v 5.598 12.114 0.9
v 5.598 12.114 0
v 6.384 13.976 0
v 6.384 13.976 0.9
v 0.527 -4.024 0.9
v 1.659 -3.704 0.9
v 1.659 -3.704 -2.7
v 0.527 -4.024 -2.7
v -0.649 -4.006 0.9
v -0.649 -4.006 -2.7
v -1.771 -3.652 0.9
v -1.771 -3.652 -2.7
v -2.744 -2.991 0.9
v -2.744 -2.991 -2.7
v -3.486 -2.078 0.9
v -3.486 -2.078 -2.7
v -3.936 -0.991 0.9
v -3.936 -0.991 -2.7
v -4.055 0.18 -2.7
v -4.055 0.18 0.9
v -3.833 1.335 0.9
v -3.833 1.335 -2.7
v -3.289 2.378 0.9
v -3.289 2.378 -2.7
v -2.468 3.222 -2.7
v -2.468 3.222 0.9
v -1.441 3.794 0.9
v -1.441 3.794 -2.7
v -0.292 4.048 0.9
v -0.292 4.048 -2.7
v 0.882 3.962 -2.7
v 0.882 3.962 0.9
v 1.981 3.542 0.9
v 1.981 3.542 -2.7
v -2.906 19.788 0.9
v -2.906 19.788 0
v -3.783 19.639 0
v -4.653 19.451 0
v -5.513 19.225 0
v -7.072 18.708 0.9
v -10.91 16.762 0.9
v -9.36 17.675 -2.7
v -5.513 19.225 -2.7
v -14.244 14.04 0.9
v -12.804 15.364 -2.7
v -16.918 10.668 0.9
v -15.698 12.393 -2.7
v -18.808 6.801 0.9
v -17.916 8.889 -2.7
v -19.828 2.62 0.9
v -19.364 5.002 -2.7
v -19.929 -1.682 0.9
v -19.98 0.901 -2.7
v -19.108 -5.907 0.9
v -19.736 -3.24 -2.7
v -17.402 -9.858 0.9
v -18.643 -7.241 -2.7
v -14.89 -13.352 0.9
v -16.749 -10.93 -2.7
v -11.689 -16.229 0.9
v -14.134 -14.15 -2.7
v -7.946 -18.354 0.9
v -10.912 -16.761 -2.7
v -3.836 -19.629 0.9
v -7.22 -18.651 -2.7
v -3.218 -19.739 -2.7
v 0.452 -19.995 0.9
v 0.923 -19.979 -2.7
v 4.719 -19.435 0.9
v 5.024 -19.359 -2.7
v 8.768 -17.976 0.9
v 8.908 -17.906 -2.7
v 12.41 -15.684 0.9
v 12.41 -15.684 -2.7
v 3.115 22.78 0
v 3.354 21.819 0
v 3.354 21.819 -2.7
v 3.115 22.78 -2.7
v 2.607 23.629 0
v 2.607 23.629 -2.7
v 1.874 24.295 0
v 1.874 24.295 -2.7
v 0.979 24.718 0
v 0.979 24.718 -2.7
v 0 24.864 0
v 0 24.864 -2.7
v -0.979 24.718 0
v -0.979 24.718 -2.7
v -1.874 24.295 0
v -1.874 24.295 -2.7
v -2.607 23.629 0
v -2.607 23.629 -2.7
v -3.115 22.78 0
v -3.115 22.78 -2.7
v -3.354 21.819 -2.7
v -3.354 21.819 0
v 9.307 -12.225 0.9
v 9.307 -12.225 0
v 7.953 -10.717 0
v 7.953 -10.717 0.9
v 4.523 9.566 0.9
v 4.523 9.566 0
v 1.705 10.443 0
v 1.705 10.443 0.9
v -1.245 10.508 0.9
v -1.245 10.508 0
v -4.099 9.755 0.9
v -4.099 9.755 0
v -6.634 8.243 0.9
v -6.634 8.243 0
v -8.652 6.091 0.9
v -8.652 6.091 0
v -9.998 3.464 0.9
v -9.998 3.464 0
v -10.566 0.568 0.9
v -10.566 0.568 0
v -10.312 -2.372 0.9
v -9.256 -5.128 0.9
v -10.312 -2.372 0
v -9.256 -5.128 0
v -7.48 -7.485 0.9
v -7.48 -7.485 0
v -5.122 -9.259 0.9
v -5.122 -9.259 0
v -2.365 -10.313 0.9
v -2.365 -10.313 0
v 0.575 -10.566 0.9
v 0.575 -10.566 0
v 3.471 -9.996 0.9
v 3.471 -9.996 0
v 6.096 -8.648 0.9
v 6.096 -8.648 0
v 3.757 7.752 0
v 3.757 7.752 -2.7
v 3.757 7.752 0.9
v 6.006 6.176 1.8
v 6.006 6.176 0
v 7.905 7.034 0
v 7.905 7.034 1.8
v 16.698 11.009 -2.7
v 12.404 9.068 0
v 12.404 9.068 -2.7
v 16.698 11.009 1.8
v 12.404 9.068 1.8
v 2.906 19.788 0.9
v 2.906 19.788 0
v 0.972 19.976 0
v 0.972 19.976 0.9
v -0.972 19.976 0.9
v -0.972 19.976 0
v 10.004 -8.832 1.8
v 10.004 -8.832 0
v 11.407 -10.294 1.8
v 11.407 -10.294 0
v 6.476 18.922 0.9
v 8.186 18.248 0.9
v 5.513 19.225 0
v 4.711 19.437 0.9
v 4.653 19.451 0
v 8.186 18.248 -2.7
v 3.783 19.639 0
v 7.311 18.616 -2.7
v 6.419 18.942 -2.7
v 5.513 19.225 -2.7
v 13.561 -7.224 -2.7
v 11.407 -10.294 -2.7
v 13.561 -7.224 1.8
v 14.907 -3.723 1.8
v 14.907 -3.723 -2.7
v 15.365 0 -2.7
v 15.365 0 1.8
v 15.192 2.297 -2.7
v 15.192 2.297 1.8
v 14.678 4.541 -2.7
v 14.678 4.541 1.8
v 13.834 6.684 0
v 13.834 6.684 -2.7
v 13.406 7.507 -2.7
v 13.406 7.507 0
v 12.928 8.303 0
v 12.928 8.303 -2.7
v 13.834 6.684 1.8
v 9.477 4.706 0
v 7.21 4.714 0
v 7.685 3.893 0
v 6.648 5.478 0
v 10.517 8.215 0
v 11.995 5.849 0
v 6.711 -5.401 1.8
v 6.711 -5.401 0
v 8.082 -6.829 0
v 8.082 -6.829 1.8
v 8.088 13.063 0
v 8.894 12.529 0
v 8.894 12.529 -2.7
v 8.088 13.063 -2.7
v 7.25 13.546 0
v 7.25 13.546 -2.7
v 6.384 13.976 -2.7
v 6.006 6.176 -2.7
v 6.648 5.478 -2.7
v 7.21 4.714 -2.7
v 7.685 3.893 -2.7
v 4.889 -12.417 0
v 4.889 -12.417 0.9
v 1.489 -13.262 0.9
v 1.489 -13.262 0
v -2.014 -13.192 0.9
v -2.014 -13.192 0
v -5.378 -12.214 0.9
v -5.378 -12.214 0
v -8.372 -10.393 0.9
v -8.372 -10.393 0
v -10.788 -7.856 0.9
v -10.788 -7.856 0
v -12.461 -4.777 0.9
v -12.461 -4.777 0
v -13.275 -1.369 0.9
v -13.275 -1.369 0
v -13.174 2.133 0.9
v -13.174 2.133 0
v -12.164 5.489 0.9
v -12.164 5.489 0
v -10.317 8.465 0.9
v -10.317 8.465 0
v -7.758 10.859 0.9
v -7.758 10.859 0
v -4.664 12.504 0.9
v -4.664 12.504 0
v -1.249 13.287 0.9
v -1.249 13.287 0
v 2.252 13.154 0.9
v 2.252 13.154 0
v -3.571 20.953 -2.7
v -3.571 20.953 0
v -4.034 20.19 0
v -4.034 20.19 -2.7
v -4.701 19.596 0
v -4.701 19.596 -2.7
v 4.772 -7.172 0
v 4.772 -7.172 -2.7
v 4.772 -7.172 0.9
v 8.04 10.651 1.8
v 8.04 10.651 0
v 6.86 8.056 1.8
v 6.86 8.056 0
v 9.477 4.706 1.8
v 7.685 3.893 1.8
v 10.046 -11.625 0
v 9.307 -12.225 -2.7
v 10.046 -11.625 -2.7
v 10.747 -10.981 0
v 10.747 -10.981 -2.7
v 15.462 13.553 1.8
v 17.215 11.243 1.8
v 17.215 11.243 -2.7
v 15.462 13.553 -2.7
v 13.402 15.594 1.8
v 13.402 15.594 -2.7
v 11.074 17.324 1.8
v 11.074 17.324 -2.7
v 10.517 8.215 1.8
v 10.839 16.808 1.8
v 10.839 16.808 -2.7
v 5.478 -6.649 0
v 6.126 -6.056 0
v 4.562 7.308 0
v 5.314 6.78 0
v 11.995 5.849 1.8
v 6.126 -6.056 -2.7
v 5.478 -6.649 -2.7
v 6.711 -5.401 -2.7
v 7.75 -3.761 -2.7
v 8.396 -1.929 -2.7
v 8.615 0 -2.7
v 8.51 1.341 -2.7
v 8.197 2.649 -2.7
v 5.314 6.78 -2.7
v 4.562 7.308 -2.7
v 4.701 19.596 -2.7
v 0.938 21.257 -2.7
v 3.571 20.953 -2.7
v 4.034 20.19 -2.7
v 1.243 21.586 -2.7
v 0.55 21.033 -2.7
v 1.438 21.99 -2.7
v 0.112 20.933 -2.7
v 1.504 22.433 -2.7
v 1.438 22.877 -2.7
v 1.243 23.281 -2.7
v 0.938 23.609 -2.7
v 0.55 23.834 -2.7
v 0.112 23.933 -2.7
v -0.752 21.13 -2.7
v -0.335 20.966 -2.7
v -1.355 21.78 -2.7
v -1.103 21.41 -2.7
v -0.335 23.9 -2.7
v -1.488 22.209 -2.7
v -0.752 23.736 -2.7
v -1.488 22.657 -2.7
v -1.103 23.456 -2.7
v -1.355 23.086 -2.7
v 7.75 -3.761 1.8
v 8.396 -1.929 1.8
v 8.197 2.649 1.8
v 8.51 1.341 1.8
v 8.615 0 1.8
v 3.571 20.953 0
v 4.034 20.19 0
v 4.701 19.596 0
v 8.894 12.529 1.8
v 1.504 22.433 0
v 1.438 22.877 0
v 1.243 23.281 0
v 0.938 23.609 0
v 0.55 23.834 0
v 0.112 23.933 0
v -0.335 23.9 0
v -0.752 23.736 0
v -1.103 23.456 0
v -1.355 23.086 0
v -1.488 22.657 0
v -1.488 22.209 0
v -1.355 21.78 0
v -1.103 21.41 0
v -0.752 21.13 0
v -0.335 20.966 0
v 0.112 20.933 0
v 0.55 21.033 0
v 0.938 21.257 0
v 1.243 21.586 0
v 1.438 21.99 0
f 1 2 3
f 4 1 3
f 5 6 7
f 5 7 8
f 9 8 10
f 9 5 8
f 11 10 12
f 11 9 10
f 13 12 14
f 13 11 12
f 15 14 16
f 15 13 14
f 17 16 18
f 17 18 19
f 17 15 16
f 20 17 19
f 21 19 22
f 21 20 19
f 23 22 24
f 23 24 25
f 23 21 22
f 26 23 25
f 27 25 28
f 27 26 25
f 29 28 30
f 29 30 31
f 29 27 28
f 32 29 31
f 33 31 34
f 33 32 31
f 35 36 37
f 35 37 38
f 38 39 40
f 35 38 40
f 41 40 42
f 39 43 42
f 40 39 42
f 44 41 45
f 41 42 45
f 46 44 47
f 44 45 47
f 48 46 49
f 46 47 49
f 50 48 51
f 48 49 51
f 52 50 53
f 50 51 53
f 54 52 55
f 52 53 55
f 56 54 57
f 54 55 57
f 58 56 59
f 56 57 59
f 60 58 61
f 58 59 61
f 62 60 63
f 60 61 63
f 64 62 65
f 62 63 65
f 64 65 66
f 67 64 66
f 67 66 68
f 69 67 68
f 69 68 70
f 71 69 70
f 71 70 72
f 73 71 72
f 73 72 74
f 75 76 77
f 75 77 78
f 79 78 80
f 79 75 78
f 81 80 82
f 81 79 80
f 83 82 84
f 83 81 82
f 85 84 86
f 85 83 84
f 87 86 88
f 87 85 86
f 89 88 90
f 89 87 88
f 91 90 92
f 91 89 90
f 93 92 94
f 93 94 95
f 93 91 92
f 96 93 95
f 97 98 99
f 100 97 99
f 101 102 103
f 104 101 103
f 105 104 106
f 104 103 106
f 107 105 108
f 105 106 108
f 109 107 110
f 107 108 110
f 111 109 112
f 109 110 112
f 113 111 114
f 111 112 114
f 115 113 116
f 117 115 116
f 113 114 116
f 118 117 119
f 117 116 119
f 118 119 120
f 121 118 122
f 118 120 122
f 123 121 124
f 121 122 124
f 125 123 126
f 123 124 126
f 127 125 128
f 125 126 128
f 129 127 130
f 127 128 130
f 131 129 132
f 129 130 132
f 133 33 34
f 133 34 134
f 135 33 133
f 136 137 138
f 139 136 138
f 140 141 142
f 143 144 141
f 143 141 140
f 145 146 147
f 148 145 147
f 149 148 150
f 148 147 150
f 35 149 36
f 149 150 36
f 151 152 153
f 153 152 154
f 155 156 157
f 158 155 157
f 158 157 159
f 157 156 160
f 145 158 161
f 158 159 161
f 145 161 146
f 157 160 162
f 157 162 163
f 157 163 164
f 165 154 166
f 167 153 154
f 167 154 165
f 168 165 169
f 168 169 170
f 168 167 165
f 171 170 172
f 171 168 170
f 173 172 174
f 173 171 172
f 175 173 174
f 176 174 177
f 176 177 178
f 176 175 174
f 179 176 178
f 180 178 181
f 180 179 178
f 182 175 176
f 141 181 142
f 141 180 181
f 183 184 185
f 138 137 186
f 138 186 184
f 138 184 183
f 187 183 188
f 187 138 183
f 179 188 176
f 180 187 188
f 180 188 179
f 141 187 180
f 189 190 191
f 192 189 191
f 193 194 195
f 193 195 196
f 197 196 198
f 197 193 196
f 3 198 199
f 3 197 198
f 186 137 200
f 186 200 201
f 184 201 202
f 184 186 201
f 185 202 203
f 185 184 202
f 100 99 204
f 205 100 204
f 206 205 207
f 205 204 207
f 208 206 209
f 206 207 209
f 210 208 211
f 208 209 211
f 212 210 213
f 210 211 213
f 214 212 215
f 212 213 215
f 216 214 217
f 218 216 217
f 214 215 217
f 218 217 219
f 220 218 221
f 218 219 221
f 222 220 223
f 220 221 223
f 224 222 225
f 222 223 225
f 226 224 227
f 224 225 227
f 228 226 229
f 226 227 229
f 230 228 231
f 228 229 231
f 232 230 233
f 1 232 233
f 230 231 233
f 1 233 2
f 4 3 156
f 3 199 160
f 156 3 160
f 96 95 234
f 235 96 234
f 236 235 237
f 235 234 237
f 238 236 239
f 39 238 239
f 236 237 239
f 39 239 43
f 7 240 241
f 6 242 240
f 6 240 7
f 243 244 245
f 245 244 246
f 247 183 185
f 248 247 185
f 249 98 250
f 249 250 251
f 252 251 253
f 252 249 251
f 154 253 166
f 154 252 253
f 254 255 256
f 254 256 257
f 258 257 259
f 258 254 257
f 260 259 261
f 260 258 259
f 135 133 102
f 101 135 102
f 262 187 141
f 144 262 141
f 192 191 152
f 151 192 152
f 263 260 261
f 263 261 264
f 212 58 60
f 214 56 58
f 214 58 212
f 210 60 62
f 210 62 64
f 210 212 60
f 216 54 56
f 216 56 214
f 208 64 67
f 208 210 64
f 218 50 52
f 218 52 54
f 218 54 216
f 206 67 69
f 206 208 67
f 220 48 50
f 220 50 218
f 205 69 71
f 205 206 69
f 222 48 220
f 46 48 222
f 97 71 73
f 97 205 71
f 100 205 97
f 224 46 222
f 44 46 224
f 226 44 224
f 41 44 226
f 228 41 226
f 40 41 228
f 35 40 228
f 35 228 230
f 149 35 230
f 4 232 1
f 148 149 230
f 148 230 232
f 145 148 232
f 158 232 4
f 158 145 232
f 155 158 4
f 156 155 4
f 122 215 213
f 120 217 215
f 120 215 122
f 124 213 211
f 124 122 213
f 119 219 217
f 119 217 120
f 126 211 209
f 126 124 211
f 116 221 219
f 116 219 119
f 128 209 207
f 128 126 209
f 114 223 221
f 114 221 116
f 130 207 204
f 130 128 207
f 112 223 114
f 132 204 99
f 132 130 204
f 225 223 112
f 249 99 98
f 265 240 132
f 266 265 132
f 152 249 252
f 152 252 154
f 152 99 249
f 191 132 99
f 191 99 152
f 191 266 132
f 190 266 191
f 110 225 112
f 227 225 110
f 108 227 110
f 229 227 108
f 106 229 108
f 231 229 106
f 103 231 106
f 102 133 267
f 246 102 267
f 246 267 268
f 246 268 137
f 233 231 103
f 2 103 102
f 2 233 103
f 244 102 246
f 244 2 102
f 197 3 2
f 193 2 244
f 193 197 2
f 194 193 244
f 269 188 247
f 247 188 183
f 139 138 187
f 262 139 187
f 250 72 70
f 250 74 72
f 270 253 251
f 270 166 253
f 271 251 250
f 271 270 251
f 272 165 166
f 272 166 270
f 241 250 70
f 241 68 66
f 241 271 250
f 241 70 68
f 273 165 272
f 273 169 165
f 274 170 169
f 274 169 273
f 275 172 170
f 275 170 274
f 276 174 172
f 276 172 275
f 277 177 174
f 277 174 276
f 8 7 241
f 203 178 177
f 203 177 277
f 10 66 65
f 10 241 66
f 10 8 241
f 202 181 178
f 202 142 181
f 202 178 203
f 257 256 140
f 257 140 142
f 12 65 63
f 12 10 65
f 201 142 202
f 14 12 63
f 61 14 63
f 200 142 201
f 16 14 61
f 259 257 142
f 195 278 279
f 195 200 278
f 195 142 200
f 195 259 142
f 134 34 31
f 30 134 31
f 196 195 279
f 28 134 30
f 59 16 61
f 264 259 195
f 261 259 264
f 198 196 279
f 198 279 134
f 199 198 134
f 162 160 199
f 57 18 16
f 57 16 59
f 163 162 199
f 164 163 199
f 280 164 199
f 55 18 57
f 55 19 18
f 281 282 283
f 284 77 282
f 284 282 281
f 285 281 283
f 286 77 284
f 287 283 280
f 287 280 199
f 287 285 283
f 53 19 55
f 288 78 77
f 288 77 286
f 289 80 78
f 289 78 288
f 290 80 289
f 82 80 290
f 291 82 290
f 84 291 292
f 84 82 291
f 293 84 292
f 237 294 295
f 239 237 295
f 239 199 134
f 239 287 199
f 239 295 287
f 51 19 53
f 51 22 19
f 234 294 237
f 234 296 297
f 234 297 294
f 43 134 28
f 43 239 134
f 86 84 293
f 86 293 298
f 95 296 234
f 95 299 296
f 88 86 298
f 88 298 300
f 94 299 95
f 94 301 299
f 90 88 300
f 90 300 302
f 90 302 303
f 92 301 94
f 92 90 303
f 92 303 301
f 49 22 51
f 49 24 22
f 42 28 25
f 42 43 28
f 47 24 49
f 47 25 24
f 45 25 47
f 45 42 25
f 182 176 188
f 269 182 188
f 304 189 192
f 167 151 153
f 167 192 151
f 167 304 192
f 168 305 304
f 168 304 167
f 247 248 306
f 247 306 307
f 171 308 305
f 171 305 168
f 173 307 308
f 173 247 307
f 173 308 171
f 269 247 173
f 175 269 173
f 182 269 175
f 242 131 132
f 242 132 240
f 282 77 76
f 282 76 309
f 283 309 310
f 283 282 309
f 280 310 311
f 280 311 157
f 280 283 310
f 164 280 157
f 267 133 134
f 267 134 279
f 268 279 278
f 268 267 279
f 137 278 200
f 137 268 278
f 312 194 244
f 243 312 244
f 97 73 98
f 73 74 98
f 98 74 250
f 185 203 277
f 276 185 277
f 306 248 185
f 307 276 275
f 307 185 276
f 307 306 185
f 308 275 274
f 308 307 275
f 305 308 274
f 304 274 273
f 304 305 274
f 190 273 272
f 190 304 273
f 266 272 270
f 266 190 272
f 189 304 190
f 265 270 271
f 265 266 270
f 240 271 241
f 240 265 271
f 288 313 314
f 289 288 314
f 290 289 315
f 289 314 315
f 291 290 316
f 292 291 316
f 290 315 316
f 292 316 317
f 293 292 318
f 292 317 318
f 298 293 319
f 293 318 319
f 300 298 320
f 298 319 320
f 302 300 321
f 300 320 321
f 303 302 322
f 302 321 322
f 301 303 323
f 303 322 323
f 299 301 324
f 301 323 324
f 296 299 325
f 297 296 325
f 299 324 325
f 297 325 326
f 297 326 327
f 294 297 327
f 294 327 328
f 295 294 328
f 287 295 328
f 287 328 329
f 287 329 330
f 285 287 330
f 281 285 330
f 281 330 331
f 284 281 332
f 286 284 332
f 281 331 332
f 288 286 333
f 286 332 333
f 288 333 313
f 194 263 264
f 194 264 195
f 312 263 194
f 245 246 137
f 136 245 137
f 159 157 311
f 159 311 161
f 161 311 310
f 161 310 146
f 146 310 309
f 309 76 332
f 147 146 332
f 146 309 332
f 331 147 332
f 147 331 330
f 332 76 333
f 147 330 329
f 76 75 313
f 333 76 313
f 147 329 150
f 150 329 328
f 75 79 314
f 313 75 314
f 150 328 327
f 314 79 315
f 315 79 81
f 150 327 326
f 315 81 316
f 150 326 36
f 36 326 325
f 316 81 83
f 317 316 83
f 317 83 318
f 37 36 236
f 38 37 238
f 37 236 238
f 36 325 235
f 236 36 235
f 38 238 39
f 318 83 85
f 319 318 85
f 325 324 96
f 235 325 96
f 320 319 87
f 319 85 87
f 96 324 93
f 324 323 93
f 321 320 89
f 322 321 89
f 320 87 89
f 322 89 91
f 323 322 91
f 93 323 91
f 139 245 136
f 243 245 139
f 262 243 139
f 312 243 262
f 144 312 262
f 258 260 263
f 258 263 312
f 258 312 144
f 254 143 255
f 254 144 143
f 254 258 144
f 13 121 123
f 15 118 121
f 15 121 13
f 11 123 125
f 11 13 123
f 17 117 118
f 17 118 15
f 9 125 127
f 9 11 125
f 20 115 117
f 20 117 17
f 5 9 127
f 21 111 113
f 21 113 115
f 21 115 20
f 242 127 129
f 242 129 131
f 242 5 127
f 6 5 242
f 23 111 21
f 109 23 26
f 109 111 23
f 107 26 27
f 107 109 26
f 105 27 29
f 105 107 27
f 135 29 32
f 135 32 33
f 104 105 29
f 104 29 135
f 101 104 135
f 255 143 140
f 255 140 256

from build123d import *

# Parameters (mm, degrees)
F0_R        = 1.5044645314
F1_DEPTH    = 2.7
F2_DEPTH    = 0.9
F3_DEPTH    = 2.7
F4_DEPTH    = 1.8
F5_T1_DEPTH = 2.7


# Not quite as in the source:
# - a fillet or chamfer that OpenCascade refuses, or shapes differently, is made with other operations: its cross-section is extruded or revolved along the edge and cut away or added


with BuildPart() as f1:
    # F0 (on Top) → F1 (new body)
    with BuildSketch(Plane.XY):
        with BuildLine():
            ThreePointArc((-2.9059050305, 19.7877668258), (-18.361479671, -7.928181651), (12.4102011034, -15.6839697964))
            Line((12.4102011034, -15.6839697964), (9.3065271924, -12.2254227754))
            ThreePointArc((9.3065271924, -12.2254227754), (-15.2699304913, -1.7034180964), (6.3836906961, 13.9757255095))
            Line((6.3836906961, 13.9757255095), (8.1864677167, 18.2477874364))
            ThreePointArc((8.1864677167, 18.2477874364), (5.5993809855, 19.2001805351), (2.9059050305, 19.7877668258))
            ThreePointArc((2.9059050305, 19.7877668258), (0, 18.1241204417), (-2.9059050305, 19.7877668258))
        make_face()
        with BuildLine():
            ThreePointArc((6.3836906961, 13.9757255095), (-15.2699304913, -1.7034180964), (9.3065271924, -12.2254227754))
            Line((9.3065271924, -12.2254227754), (7.9527661976, -10.7168731694))
            ThreePointArc((7.9527661976, -10.7168731694), (-13.2749249311, -1.3690247612), (5.5982117915, 12.114366903))
            Line((5.5982117915, 12.114366903), (6.3836906961, 13.9757255095))
        make_face()
        with BuildLine():
            ThreePointArc((5.5982117915, 12.114366903), (-13.2749249311, -1.3690247612), (7.9527661976, -10.7168731694))
            Line((7.9527661976, -10.7168731694), (6.0964799797, -8.6483397626))
            ThreePointArc((6.0964799797, -8.6483397626), (-10.5418803683, -0.9108276969), (4.5227579261, 9.5658512185))
            Line((4.5227579261, 9.5658512185), (5.5982117915, 12.114366903))
        make_face()
        with BuildLine():
            ThreePointArc((4.5227579261, 9.5658512185), (-10.5418803683, -0.9108276969), (6.0964799797, -8.6483397626))
            Line((6.0964799797, -8.6483397626), (4.7718042528, -7.1722010249))
            ThreePointArc((4.7718042528, -7.1722010249), (-8.5947223482, -0.5842355063), (3.7573171653, 7.7519772374))
            Line((3.7573171653, 7.7519772374), (4.5227579261, 9.5658512185))
        make_face()
        with BuildLine():
            ThreePointArc((3.7573171653, 7.7519772374), (-8.5947223482, -0.5842355063), (4.7718042528, -7.1722010249))
            Line((4.7718042528, -7.1722010249), (1.6593857385, -3.7039095455))
            ThreePointArc((1.6593857385, -3.7039095455), (-4.0546444127, 0.1799045205), (1.9809039535, 3.5423899386))
            Line((1.9809039535, 3.5423899386), (3.7573171653, 7.7519772374))
        make_face()
        with BuildLine():
            ThreePointArc((2.9059050305, 19.7877668258), (0, 20), (-2.9059050305, 19.7877668258))
            ThreePointArc((-2.9059050305, 19.7877668258), (0, 18.1241204417), (2.9059050305, 19.7877668258))
        make_face()
        with BuildLine():
            ThreePointArc((-3.157685128, 20.3174125427), (-3.043339046, 20.0471019762), (-2.9059050305, 19.7877668258))
            ThreePointArc((-2.9059050305, 19.7877668258), (0, 20), (2.9059050305, 19.7877668258))
            ThreePointArc((2.9059050305, 19.7877668258), (3.043339046, 20.0471019762), (3.157685128, 20.3174125427))
            ThreePointArc((3.157685128, 20.3174125427), (0, 20.5613284541), (-3.157685128, 20.3174125427))
        make_face()
        with BuildLine():
            ThreePointArc((3.3697074825, 21.4938279241), (-0.5976844127, 24.8101062388), (-3.157685128, 20.3174125427))
            ThreePointArc((-3.157685128, 20.3174125427), (0, 20.5613284541), (3.157685128, 20.3174125427))
            ThreePointArc((3.157685128, 20.3174125427), (3.3162783146, 20.8961435115), (3.3697074825, 21.4938279241))
        make_face()
        with Locations((0, 22.4330537021)):
            Circle(F0_R, mode=Mode.SUBTRACT)
        with BuildLine():
            ThreePointArc((13.8344540426, 6.6843318112), (13.1730545976, 7.9084159596), (12.4036340143, 9.0676498421))
            Line((12.4036340143, 9.0676498421), (10.5172175152, 8.21498609))
            ThreePointArc((10.5172175152, 8.21498609), (11.318131065, 7.0709101194), (11.995098321, 5.8493997121))
            Line((11.995098321, 5.8493997121), (13.8344540426, 6.6843318112))
        make_face()
        with BuildLine():
            ThreePointArc((11.995098321, 5.8493997121), (11.318131065, 7.0709101194), (10.5172175152, 8.21498609))
            Line((10.5172175152, 8.21498609), (7.9045951482, 7.0340759404))
            ThreePointArc((7.9045951482, 7.0340759404), (8.7683299388, 5.9226040621), (9.4768887451, 4.706317935))
            Line((9.4768887451, 4.706317935), (11.995098321, 5.8493997121))
        make_face()
        with BuildLine():
            ThreePointArc((9.4768887451, 4.706317935), (8.7683299388, 5.9226040621), (7.9045951482, 7.0340759404))
            Line((7.9045951482, 7.0340759404), (6.0058132946, 6.1758230253))
            ThreePointArc((6.0058132946, 6.1758230253), (6.9398340598, 5.1038501734), (7.6848114732, 3.8928467719))
            Line((7.6848114732, 3.8928467719), (9.4768887451, 4.706317935))
        make_face()
        with BuildLine():
            Line((6.0058132946, 6.1758230253), (7.9045951482, 7.0340759404))
            ThreePointArc((7.9045951482, 7.0340759404), (7.4001814409, 7.5629467428), (6.8604632985, 8.0557365971))
            Line((6.8604632985, 8.0557365971), (6.0058132946, 6.1758230253))
        make_face()
        with BuildLine():
            ThreePointArc((6.8604632985, 8.0557365971), (5.7414756731, 8.8879866049), (4.5227579261, 9.5658512185))
            Line((4.5227579261, 9.5658512185), (3.7573171653, 7.7519772374))
            ThreePointArc((3.7573171653, 7.7519772374), (4.9447694202, 7.0540654058), (6.0058132946, 6.1758230253))
            Line((6.0058132946, 6.1758230253), (6.8604632985, 8.0557365971))
        make_face()
        with BuildLine():
            ThreePointArc((8.0404414582, 10.6512516579), (6.8584540657, 11.4481207432), (5.5982117915, 12.114366903))
            Line((5.5982117915, 12.114366903), (4.5227579261, 9.5658512185))
            ThreePointArc((4.5227579261, 9.5658512185), (5.7414756731, 8.8879866049), (6.8604632985, 8.0557365971))
            Line((6.8604632985, 8.0557365971), (8.0404414582, 10.6512516579))
        make_face()
        with BuildLine():
            ThreePointArc((8.8939895289, 12.5287413845), (7.6730254156, 13.3115397829), (6.3836906961, 13.9757255095))
            Line((6.3836906961, 13.9757255095), (5.5982117915, 12.114366903))
            ThreePointArc((5.5982117915, 12.114366903), (6.8584540657, 11.4481207432), (8.0404414582, 10.6512516579))
            Line((8.0404414582, 10.6512516579), (8.8939895289, 12.5287413845))
        make_face()
        with BuildLine():
            Line((7.9045951482, 7.0340759404), (10.5172175152, 8.21498609))
            ThreePointArc((10.5172175152, 8.21498609), (9.3584466725, 9.514059943), (8.0404414582, 10.6512516579))
            Line((8.0404414582, 10.6512516579), (6.8604632985, 8.0557365971))
            ThreePointArc((6.8604632985, 8.0557365971), (7.4001814409, 7.5629467428), (7.9045951482, 7.0340759404))
        make_face()
        with BuildLine():
            Line((10.5172175152, 8.21498609), (12.4036340143, 9.0676498421))
            ThreePointArc((12.4036340143, 9.0676498421), (10.7885115198, 10.9398550999), (8.8939895289, 12.5287413845))
            Line((8.8939895289, 12.5287413845), (8.0404414582, 10.6512516579))
            ThreePointArc((8.0404414582, 10.6512516579), (9.3584466725, 9.514059943), (10.5172175152, 8.21498609))
        make_face()
        with BuildLine():
            Line((12.4036340143, 9.0676498421), (16.6976556484, 11.008555575))
            ThreePointArc((16.6976556484, 11.008555575), (14.070563524, 14.2133473227), (10.8394114429, 16.807949297))
            Line((10.8394114429, 16.807949297), (8.8939895289, 12.5287413845))
            ThreePointArc((8.8939895289, 12.5287413845), (10.7885115198, 10.9398550999), (12.4036340143, 9.0676498421))
        make_face()
        with BuildLine():
            ThreePointArc((10.8394114429, 16.807949297), (14.070563524, 14.2133473227), (16.6976556484, 11.008555575))
            Line((16.6976556484, 11.008555575), (17.2154603994, 11.2426042817))
            ThreePointArc((17.2154603994, 11.2426042817), (14.4679762691, 14.6097874889), (11.0741551061, 17.3242984413))
            Line((11.0741551061, 17.3242984413), (10.8394114429, 16.807949297))
        make_face()
    extrude(amount=-F1_DEPTH)

    # F0 (on Top) → F2 (join)
    with BuildSketch(Plane.XY):
        with BuildLine():
            ThreePointArc((-2.9059050305, 19.7877668258), (-18.361479671, -7.928181651), (12.4102011034, -15.6839697964))
            Line((12.4102011034, -15.6839697964), (9.3065271924, -12.2254227754))
            ThreePointArc((9.3065271924, -12.2254227754), (-15.2699304913, -1.7034180964), (6.3836906961, 13.9757255095))
            Line((6.3836906961, 13.9757255095), (8.1864677167, 18.2477874364))
            ThreePointArc((8.1864677167, 18.2477874364), (5.5993809855, 19.2001805351), (2.9059050305, 19.7877668258))
            ThreePointArc((2.9059050305, 19.7877668258), (0, 18.1241204417), (-2.9059050305, 19.7877668258))
        make_face()
        with BuildLine():
            ThreePointArc((6.3836906961, 13.9757255095), (-15.2699304913, -1.7034180964), (9.3065271924, -12.2254227754))
            Line((9.3065271924, -12.2254227754), (7.9527661976, -10.7168731694))
            ThreePointArc((7.9527661976, -10.7168731694), (-13.2749249311, -1.3690247612), (5.5982117915, 12.114366903))
            Line((5.5982117915, 12.114366903), (6.3836906961, 13.9757255095))
        make_face()
        with BuildLine():
            ThreePointArc((4.5227579261, 9.5658512185), (-10.5418803683, -0.9108276969), (6.0964799797, -8.6483397626))
            Line((6.0964799797, -8.6483397626), (4.7718042528, -7.1722010249))
            ThreePointArc((4.7718042528, -7.1722010249), (-8.5947223482, -0.5842355063), (3.7573171653, 7.7519772374))
            Line((3.7573171653, 7.7519772374), (4.5227579261, 9.5658512185))
        make_face()
        with BuildLine():
            ThreePointArc((3.7573171653, 7.7519772374), (-8.5947223482, -0.5842355063), (4.7718042528, -7.1722010249))
            Line((4.7718042528, -7.1722010249), (1.6593857385, -3.7039095455))
            ThreePointArc((1.6593857385, -3.7039095455), (-4.0546444127, 0.1799045205), (1.9809039535, 3.5423899386))
            Line((1.9809039535, 3.5423899386), (3.7573171653, 7.7519772374))
        make_face()
        with BuildLine():
            ThreePointArc((2.9059050305, 19.7877668258), (0, 20), (-2.9059050305, 19.7877668258))
            ThreePointArc((-2.9059050305, 19.7877668258), (0, 18.1241204417), (2.9059050305, 19.7877668258))
        make_face()
    extrude(amount=F2_DEPTH)

    # F0 (on Top) → F3 (join)
    with BuildSketch(Plane.XY):
        with BuildLine():
            Line((6.7113864418, -5.4007291543), (8.0821585416, -6.8293163715))
            ThreePointArc((8.0821585416, -6.8293163715), (9.9367857977, -3.6360881181), (10.5811553619, 0))
            ThreePointArc((10.5811553619, 0), (10.3013902205, 2.4170660555), (9.4768887451, 4.706317935))
            Line((9.4768887451, 4.706317935), (7.6848114732, 3.8928467719))
            ThreePointArc((7.6848114732, 3.8928467719), (8.3788968801, 2.00116727), (8.6145564813, 0))
            ThreePointArc((8.6145564813, 0), (8.1248446428, -2.8631246741), (6.7113864418, -5.4007291543))
        make_face()
        with BuildLine():
            Line((8.0821585416, -6.8293163715), (10.0042554899, -8.8324816906))
            ThreePointArc((10.0042554899, -8.8324816906), (12.4821464921, -4.721639511), (13.3453310458, 0))
            ThreePointArc((13.3453310458, 0), (13.0033922255, 3.0016081275), (11.995098321, 5.8493997121))
            Line((11.995098321, 5.8493997121), (9.4768887451, 4.706317935))
            ThreePointArc((9.4768887451, 4.706317935), (10.3013902205, 2.4170660555), (10.5811553619, 0))
            ThreePointArc((10.5811553619, 0), (9.9367857977, -3.6360881181), (8.0821585416, -6.8293163715))
        make_face()
        with BuildLine():
            Line((10.0042554899, -8.8324816906), (11.4065098197, -10.2938789654))
            ThreePointArc((11.4065098197, -10.2938789654), (14.3410149492, -5.5143177862), (15.3646480734, 0))
            ThreePointArc((15.3646480734, 0), (14.9772148291, 3.4286216448), (13.8344540426, 6.6843318112))
            Line((13.8344540426, 6.6843318112), (11.995098321, 5.8493997121))
            ThreePointArc((11.995098321, 5.8493997121), (13.0033922255, 3.0016081275), (13.3453310458, 0))
            ThreePointArc((13.3453310458, 0), (12.4821464921, -4.721639511), (10.0042554899, -8.8324816906))
        make_face()
        with BuildLine():
            Line((7.9527661976, -10.7168731694), (9.3065271924, -12.2254227754))
            ThreePointArc((9.3065271924, -12.2254227754), (10.4014513861, -11.3085020883), (11.4065098197, -10.2938789654))
            Line((11.4065098197, -10.2938789654), (10.0042554899, -8.8324816906))
            ThreePointArc((10.0042554899, -8.8324816906), (9.0278120152, -9.8283503672), (7.9527661976, -10.7168731694))
        make_face()
        with BuildLine():
            Line((6.0964799797, -8.6483397626), (7.9527661976, -10.7168731694))
            ThreePointArc((7.9527661976, -10.7168731694), (9.0278120152, -9.8283503672), (10.0042554899, -8.8324816906))
            Line((10.0042554899, -8.8324816906), (8.0821585416, -6.8293163715))
            ThreePointArc((8.0821585416, -6.8293163715), (7.1474232492, -7.8022554232), (6.0964799797, -8.6483397626))
        make_face()
        with BuildLine():
            Line((4.7718042528, -7.1722010249), (6.0964799797, -8.6483397626))
            ThreePointArc((6.0964799797, -8.6483397626), (7.1474232492, -7.8022554232), (8.0821585416, -6.8293163715))
            Line((8.0821585416, -6.8293163715), (6.7113864418, -5.4007291543))
            ThreePointArc((6.7113864418, -5.4007291543), (5.8095133427, -6.3608284122), (4.7718042528, -7.1722010249))
        make_face()
    extrude(amount=-F3_DEPTH)

    # F0 (on Top) → F4 (join)
    with BuildSketch(Plane.XY):
        with BuildLine():
            Line((10.0042554899, -8.8324816906), (11.4065098197, -10.2938789654))
            ThreePointArc((11.4065098197, -10.2938789654), (14.3410149492, -5.5143177862), (15.3646480734, 0))
            ThreePointArc((15.3646480734, 0), (14.9772148291, 3.4286216448), (13.8344540426, 6.6843318112))
            Line((13.8344540426, 6.6843318112), (11.995098321, 5.8493997121))
            ThreePointArc((11.995098321, 5.8493997121), (13.0033922255, 3.0016081275), (13.3453310458, 0))
            ThreePointArc((13.3453310458, 0), (12.4821464921, -4.721639511), (10.0042554899, -8.8324816906))
        make_face()
        with BuildLine():
            Line((8.0821585416, -6.8293163715), (10.0042554899, -8.8324816906))
            ThreePointArc((10.0042554899, -8.8324816906), (12.4821464921, -4.721639511), (13.3453310458, 0))
            ThreePointArc((13.3453310458, 0), (13.0033922255, 3.0016081275), (11.995098321, 5.8493997121))
            Line((11.995098321, 5.8493997121), (9.4768887451, 4.706317935))
            ThreePointArc((9.4768887451, 4.706317935), (10.3013902205, 2.4170660555), (10.5811553619, 0))
            ThreePointArc((10.5811553619, 0), (9.9367857977, -3.6360881181), (8.0821585416, -6.8293163715))
        make_face()
        with BuildLine():
            Line((6.7113864418, -5.4007291543), (8.0821585416, -6.8293163715))
            ThreePointArc((8.0821585416, -6.8293163715), (9.9367857977, -3.6360881181), (10.5811553619, 0))
            ThreePointArc((10.5811553619, 0), (10.3013902205, 2.4170660555), (9.4768887451, 4.706317935))
            Line((9.4768887451, 4.706317935), (7.6848114732, 3.8928467719))
            ThreePointArc((7.6848114732, 3.8928467719), (8.3788968801, 2.00116727), (8.6145564813, 0))
            ThreePointArc((8.6145564813, 0), (8.1248446428, -2.8631246741), (6.7113864418, -5.4007291543))
        make_face()
        with BuildLine():
            ThreePointArc((10.8394114429, 16.807949297), (14.070563524, 14.2133473227), (16.6976556484, 11.008555575))
            Line((16.6976556484, 11.008555575), (17.2154603994, 11.2426042817))
            ThreePointArc((17.2154603994, 11.2426042817), (14.4679762691, 14.6097874889), (11.0741551061, 17.3242984413))
            Line((11.0741551061, 17.3242984413), (10.8394114429, 16.807949297))
        make_face()
        with BuildLine():
            Line((6.0058132946, 6.1758230253), (7.9045951482, 7.0340759404))
            ThreePointArc((7.9045951482, 7.0340759404), (7.4001814409, 7.5629467428), (6.8604632985, 8.0557365971))
            Line((6.8604632985, 8.0557365971), (6.0058132946, 6.1758230253))
        make_face()
        with BuildLine():
            Line((7.9045951482, 7.0340759404), (10.5172175152, 8.21498609))
            ThreePointArc((10.5172175152, 8.21498609), (9.3584466725, 9.514059943), (8.0404414582, 10.6512516579))
            Line((8.0404414582, 10.6512516579), (6.8604632985, 8.0557365971))
            ThreePointArc((6.8604632985, 8.0557365971), (7.4001814409, 7.5629467428), (7.9045951482, 7.0340759404))
        make_face()
        with BuildLine():
            Line((10.5172175152, 8.21498609), (12.4036340143, 9.0676498421))
            ThreePointArc((12.4036340143, 9.0676498421), (10.7885115198, 10.9398550999), (8.8939895289, 12.5287413845))
            Line((8.8939895289, 12.5287413845), (8.0404414582, 10.6512516579))
            ThreePointArc((8.0404414582, 10.6512516579), (9.3584466725, 9.514059943), (10.5172175152, 8.21498609))
        make_face()
        with BuildLine():
            Line((12.4036340143, 9.0676498421), (16.6976556484, 11.008555575))
            ThreePointArc((16.6976556484, 11.008555575), (14.070563524, 14.2133473227), (10.8394114429, 16.807949297))
            Line((10.8394114429, 16.807949297), (8.8939895289, 12.5287413845))
            ThreePointArc((8.8939895289, 12.5287413845), (10.7885115198, 10.9398550999), (12.4036340143, 9.0676498421))
        make_face()
    extrude(amount=F4_DEPTH)

    # F5: fillet of radius 3 on 2 edges, made by hand

    # F5_s2 → F5_t1 (join)
    with BuildSketch(Plane.XY.offset(-2.7)):
        with BuildLine():
            ThreePointArc((3.3539587166, 21.8192345075), (4.0340965589, 20.1897997022), (5.5129894146, 19.2251644392))
            ThreePointArc((5.5129894146, 19.2251644392), (4.2188358916, 19.5499724736), (2.9059050305, 19.7877668258))
            ThreePointArc((2.9059050305, 19.7877668258), (3.2906213347, 20.768059539), (3.3539587166, 21.8192345075))
        make_face()
        with BuildLine():
            ThreePointArc((-3.3539587166, 21.8192345075), (-4.0340965589, 20.1897997022), (-5.5129894146, 19.2251644392))
            ThreePointArc((-5.5129894146, 19.2251644392), (-4.2188358916, 19.5499724736), (-2.9059050305, 19.7877668258))
            ThreePointArc((-2.9059050305, 19.7877668258), (-3.2906213347, 20.768059539), (-3.3539587166, 21.8192345075))
        make_face()
    extrude(amount=F5_T1_DEPTH)


solid = f1.part
